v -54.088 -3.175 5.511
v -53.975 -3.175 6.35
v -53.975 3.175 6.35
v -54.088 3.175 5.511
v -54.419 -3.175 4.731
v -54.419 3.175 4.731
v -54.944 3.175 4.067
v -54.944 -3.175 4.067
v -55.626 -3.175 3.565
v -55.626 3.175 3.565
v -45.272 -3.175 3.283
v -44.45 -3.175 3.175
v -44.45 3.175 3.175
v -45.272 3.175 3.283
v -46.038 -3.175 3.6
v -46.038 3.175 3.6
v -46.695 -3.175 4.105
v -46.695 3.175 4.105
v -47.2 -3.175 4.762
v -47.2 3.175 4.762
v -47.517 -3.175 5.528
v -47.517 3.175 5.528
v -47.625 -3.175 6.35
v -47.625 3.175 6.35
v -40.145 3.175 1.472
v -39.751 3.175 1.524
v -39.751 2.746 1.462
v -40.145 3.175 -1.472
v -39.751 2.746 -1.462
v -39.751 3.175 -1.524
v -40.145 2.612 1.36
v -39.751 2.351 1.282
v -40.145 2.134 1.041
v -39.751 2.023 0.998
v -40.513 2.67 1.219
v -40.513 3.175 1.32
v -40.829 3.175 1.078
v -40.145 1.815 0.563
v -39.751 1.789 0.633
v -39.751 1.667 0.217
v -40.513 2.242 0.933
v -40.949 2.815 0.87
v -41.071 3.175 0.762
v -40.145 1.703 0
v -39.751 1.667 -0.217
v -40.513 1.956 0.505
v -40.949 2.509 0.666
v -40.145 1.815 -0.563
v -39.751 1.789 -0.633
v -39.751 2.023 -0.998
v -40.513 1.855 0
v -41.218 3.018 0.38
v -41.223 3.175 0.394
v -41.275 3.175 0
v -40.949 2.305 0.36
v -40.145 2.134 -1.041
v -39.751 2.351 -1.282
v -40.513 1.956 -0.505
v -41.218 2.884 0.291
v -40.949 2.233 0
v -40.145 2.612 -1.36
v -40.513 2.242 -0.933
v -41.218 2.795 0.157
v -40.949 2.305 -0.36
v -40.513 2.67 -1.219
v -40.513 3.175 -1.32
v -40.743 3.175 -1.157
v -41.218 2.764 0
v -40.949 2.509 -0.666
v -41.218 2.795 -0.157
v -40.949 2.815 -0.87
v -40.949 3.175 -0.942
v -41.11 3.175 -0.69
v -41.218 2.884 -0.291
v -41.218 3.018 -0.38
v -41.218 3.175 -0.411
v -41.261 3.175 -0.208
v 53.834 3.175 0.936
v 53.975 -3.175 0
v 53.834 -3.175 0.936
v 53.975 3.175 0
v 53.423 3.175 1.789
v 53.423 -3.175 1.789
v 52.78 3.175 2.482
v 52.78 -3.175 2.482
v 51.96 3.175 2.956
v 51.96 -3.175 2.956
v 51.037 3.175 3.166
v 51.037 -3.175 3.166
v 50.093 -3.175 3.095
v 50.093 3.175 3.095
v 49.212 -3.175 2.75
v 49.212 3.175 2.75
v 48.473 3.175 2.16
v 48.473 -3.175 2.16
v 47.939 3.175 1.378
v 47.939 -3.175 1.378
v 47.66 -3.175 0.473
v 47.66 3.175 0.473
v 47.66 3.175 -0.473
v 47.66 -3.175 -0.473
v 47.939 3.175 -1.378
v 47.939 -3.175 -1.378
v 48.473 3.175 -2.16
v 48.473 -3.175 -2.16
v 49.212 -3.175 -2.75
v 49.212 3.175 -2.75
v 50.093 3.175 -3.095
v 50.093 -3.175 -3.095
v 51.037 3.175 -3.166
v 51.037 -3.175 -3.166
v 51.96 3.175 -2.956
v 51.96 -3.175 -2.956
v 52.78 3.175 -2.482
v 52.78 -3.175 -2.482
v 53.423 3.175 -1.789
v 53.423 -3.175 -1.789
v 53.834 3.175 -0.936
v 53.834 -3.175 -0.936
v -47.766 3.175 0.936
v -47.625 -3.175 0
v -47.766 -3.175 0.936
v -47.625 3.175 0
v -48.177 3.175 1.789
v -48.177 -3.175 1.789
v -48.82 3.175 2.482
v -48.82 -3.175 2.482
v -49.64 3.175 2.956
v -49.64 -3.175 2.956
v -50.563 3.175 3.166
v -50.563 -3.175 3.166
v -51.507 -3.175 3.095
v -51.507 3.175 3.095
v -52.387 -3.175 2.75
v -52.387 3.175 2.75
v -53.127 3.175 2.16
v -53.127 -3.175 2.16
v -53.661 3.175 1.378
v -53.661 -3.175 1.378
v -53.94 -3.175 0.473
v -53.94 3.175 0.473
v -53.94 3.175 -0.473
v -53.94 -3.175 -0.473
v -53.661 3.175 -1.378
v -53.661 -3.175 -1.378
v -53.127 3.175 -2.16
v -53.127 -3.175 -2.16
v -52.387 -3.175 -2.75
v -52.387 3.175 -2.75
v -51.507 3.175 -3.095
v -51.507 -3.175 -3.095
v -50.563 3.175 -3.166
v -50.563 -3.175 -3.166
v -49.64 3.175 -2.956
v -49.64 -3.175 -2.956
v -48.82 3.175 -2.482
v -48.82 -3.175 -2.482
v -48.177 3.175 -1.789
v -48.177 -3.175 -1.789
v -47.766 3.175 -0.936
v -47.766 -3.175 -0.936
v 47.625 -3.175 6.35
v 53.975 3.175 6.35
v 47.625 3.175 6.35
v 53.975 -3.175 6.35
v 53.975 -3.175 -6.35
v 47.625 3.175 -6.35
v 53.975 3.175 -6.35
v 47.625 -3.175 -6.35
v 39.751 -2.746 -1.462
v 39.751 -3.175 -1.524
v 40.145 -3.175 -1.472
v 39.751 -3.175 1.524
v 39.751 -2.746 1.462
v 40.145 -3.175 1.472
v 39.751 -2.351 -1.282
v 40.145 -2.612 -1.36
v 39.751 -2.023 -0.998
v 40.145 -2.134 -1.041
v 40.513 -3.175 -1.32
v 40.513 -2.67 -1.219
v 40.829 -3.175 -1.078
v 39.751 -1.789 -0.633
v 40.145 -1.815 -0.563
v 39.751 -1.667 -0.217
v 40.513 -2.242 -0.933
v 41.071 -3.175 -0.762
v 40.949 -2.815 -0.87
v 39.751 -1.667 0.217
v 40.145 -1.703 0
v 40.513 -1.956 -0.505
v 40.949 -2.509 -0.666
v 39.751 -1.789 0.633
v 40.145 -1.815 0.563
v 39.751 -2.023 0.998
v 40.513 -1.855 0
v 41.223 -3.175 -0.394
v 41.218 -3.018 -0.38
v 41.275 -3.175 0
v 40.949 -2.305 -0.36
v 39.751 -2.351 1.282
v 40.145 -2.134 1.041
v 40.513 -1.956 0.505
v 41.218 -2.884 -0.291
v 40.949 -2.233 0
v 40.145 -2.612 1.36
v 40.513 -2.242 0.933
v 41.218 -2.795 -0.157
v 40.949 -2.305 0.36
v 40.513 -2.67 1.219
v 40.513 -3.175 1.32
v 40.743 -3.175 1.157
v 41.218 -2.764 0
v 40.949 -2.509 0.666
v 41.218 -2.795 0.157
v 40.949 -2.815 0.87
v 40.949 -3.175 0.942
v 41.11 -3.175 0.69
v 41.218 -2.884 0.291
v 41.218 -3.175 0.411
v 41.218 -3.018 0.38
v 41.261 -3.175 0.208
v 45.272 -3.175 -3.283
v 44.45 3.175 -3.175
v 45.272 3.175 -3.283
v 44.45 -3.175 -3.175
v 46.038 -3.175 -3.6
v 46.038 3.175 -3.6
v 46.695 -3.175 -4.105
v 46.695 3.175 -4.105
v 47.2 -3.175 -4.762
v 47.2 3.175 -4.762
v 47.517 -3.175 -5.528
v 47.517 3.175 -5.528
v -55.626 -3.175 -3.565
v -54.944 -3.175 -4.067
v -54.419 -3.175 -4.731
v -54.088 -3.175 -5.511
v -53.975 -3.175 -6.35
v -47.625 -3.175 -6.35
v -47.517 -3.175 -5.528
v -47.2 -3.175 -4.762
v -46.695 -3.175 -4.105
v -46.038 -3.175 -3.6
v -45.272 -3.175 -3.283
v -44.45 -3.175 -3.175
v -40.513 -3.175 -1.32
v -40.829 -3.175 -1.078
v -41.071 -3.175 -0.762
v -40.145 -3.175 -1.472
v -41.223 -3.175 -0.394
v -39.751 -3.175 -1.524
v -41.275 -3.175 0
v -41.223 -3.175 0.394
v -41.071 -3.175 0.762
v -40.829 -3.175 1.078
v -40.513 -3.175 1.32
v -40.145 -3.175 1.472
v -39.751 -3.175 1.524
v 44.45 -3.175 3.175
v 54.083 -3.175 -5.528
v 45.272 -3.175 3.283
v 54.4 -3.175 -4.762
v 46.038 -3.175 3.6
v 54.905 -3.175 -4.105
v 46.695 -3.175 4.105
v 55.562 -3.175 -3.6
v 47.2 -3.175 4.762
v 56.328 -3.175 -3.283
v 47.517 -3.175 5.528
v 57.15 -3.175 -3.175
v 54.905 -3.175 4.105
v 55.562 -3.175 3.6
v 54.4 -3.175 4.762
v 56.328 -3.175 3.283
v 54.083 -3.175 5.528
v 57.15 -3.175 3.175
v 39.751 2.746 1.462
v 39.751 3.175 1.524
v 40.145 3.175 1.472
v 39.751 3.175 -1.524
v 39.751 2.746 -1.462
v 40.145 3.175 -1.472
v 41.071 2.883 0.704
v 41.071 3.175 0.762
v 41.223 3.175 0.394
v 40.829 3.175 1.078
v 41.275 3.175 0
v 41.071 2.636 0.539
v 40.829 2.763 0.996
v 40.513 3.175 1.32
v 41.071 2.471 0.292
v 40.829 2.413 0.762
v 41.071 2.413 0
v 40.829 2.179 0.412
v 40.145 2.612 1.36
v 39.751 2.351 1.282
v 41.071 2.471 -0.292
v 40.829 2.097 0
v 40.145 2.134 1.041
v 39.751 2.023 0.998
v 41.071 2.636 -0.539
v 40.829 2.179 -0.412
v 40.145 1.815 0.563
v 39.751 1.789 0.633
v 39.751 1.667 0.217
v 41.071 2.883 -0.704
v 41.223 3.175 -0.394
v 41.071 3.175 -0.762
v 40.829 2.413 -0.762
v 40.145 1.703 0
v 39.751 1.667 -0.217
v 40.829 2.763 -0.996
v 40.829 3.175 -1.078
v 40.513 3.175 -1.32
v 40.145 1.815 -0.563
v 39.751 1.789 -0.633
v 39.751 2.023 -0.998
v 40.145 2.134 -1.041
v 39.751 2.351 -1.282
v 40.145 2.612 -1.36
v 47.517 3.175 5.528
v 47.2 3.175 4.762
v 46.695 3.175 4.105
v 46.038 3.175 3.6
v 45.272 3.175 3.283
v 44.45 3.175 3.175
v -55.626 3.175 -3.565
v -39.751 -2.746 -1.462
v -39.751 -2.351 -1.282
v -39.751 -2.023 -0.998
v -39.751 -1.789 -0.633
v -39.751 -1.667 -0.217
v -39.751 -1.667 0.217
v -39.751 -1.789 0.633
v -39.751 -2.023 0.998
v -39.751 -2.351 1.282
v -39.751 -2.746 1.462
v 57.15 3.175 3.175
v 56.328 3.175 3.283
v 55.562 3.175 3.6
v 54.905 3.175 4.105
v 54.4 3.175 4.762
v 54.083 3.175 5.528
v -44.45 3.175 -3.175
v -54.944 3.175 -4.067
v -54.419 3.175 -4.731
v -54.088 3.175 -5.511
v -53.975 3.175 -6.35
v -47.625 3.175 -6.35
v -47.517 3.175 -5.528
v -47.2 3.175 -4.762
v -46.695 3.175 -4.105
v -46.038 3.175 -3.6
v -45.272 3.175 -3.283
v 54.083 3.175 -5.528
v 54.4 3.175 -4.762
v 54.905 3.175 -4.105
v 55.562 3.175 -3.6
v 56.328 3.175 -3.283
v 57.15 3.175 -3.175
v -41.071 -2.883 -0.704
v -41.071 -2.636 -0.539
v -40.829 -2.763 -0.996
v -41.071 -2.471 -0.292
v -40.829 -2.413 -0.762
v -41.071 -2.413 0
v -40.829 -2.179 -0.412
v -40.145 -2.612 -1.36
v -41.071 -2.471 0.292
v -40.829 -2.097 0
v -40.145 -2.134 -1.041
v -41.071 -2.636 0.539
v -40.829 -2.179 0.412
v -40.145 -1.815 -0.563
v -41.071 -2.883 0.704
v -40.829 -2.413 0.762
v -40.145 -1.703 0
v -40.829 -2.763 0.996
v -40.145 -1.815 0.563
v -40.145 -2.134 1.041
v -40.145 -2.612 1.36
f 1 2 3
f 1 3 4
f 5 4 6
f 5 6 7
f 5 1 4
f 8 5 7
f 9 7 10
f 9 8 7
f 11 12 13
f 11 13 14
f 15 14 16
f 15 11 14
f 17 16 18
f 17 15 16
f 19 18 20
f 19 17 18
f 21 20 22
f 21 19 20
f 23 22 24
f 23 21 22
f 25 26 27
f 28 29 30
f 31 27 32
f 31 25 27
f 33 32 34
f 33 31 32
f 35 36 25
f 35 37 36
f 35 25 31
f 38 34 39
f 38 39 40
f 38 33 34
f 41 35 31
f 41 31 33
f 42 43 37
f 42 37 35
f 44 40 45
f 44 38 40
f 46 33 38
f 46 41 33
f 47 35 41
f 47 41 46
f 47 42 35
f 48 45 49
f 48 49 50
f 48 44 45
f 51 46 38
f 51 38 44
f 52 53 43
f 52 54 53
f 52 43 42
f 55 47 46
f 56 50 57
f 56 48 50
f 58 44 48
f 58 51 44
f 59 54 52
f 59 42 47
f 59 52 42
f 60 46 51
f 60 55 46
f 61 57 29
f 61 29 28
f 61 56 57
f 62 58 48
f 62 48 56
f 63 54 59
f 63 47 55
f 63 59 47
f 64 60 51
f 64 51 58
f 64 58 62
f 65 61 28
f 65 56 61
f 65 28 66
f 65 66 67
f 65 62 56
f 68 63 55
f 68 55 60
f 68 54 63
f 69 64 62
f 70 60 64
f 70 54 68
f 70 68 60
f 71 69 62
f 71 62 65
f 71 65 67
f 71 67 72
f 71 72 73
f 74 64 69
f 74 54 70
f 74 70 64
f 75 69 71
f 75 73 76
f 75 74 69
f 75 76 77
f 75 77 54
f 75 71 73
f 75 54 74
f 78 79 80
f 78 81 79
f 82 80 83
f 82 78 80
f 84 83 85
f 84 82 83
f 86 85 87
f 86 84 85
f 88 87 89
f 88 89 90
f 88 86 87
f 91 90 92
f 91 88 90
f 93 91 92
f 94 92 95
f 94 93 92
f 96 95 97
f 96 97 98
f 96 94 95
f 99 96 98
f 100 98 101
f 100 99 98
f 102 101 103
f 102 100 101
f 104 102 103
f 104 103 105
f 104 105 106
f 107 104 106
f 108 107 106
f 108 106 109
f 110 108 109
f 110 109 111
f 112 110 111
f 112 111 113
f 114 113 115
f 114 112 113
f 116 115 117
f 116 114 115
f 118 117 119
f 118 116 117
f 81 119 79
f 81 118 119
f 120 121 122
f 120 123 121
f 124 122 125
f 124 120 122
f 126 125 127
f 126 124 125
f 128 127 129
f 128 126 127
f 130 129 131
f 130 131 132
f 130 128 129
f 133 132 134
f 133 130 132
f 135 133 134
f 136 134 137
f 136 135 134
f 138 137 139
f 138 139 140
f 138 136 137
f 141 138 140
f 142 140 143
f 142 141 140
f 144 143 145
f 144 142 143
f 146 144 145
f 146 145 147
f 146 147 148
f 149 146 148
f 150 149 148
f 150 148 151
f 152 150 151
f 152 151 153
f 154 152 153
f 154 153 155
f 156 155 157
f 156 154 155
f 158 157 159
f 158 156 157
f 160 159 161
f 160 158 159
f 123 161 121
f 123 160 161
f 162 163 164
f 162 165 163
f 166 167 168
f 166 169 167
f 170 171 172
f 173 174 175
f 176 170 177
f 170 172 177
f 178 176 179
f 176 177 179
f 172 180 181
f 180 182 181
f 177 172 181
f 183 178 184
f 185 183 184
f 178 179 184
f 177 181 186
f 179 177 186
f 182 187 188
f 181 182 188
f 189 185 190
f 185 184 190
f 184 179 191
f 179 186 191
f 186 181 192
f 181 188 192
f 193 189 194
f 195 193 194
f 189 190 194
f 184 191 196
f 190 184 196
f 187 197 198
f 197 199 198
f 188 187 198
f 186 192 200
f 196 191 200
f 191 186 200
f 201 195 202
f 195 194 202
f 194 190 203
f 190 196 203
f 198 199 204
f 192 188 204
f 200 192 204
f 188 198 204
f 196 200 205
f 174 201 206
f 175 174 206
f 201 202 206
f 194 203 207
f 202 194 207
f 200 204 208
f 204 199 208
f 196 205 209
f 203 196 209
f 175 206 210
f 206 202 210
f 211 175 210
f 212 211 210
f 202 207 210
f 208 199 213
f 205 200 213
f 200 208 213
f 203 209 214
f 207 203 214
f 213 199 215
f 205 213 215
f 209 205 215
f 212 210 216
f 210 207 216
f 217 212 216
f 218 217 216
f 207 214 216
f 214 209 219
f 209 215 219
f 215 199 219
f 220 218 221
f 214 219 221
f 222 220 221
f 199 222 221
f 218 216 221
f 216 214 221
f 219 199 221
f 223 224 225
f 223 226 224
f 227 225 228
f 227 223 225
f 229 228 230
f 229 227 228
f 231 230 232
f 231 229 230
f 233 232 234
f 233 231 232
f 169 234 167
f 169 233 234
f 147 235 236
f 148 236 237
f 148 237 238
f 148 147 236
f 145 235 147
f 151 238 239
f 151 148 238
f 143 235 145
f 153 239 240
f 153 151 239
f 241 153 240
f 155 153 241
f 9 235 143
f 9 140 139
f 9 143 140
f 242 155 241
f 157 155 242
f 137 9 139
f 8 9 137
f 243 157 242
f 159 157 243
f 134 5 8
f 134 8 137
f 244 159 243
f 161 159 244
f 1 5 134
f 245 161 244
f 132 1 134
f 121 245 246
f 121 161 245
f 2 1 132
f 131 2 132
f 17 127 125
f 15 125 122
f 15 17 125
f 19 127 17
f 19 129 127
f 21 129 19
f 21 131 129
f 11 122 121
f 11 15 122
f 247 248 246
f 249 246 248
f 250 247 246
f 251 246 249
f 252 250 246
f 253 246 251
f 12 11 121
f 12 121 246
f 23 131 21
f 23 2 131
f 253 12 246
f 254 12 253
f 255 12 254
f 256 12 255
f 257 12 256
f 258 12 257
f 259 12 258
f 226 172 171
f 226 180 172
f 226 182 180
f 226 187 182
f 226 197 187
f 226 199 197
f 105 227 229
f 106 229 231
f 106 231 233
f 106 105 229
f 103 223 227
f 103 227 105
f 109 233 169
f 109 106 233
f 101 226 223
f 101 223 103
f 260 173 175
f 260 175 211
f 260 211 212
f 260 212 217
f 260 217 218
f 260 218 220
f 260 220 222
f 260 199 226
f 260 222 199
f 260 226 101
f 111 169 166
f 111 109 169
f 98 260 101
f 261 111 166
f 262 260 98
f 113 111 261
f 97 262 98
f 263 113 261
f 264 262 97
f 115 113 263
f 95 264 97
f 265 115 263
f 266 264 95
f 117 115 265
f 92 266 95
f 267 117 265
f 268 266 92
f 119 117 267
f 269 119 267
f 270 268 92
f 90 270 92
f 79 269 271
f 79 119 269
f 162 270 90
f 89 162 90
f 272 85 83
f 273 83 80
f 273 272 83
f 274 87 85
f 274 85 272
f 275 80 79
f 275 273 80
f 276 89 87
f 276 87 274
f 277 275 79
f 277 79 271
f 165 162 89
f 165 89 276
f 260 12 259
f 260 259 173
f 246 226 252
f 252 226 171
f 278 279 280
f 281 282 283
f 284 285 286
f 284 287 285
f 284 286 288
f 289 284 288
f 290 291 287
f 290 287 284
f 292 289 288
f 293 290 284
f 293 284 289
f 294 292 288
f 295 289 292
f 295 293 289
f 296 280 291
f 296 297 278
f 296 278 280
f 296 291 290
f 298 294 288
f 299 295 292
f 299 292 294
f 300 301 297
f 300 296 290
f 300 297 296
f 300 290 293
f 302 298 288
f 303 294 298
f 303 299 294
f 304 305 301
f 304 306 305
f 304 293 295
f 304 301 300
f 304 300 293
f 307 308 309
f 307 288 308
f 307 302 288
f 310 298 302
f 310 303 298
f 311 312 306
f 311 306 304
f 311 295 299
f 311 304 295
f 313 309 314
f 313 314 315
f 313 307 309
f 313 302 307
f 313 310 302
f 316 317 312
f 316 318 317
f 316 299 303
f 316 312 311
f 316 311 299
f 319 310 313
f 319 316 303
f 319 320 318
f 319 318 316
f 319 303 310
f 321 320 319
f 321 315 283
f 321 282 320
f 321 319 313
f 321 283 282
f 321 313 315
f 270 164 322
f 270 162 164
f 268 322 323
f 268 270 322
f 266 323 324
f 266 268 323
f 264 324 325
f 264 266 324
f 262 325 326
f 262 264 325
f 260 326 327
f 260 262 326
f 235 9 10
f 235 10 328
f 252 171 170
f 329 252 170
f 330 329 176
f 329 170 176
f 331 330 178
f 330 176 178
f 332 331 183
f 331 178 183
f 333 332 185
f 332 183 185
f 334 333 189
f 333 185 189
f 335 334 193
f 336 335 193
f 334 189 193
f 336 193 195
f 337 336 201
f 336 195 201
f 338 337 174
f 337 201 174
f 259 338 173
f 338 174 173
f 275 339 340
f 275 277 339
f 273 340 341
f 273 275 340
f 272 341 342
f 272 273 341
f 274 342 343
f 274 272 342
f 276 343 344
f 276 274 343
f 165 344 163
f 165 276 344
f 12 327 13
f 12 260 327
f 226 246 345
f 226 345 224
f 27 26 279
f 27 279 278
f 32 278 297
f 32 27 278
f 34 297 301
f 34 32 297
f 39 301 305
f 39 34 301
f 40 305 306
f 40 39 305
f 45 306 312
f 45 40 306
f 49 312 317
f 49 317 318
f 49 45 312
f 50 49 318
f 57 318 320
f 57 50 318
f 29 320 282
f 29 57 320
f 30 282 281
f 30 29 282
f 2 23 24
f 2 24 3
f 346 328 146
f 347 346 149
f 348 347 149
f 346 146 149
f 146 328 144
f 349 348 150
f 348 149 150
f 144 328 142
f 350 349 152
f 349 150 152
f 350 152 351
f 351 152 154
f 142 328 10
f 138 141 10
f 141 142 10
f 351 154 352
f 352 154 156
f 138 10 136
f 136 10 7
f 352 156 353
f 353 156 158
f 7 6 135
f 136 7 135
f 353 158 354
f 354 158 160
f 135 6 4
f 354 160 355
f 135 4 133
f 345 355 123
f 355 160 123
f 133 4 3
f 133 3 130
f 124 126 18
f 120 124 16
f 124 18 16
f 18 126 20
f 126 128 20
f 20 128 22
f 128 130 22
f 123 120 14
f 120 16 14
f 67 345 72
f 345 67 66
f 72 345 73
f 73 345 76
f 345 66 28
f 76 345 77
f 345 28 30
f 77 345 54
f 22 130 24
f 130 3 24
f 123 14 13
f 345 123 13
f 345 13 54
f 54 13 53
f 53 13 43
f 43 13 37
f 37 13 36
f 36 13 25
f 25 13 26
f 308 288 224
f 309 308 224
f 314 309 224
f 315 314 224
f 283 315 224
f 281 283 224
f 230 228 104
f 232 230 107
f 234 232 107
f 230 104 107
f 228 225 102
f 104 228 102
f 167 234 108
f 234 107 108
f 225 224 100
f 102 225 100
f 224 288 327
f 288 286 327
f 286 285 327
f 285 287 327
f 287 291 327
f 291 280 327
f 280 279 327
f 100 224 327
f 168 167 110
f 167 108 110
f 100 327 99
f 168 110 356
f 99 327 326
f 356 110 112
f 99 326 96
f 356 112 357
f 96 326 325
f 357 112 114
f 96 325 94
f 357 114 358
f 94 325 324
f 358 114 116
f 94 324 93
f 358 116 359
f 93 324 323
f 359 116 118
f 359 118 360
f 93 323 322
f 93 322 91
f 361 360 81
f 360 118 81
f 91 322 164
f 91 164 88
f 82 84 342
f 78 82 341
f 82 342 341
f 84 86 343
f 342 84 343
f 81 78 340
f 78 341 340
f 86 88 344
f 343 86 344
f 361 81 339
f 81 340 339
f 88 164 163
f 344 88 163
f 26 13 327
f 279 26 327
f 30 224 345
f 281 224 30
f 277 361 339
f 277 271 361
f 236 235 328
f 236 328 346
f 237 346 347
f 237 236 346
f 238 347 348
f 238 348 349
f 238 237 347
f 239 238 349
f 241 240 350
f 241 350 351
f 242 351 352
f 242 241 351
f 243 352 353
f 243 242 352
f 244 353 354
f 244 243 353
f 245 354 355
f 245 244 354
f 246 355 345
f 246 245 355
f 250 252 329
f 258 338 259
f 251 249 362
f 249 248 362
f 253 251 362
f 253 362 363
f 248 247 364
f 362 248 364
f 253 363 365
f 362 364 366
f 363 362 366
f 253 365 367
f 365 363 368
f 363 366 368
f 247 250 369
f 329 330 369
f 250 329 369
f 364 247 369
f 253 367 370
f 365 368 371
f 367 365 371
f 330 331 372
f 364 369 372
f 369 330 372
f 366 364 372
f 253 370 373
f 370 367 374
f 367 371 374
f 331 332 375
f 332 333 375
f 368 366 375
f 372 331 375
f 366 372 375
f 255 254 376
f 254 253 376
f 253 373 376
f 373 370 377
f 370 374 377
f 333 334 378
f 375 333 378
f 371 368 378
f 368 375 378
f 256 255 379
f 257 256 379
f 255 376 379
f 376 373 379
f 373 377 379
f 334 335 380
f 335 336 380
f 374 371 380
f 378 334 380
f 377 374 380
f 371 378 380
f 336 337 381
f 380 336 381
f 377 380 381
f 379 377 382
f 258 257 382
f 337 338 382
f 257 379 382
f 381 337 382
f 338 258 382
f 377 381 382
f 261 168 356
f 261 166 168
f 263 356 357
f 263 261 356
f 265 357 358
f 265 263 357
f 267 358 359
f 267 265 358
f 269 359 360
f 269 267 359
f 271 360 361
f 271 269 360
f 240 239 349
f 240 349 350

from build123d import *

# Parameters (mm, degrees)
F0_R     = 3.175
F1_DEPTH = 3.175
F3_DEPTH = 41.275
F4_R     = 1.52399


# Not quite as in the source:
# - a fillet or chamfer is up to 0.001 mm smaller than in the source, because OpenCascade refuses the exact size


with BuildPart() as f1:
    # F0 (on Front) → F1 (new body, symmetric)
    with BuildSketch(Plane.XZ):
        with BuildLine():
            Line((44.45, 3.175), (-44.45, 3.175))
            ThreePointArc((-44.45, 3.175), (-46.6950640303, 4.1049359697), (-47.625, 6.35))
            Line((-47.625, 6.35), (-53.975, 6.35))
            ThreePointArc((-53.975, 6.35), (-54.4187617277, 4.7310613044), (-55.626, 3.5646725507))
            Line((-55.626, 3.5646725507), (-55.626, -3.5646725507))
            ThreePointArc((-55.626, -3.5646725507), (-54.4187617277, -4.7310613044), (-53.975, -6.35))
            Line((-53.975, -6.35), (-47.625, -6.35))
            ThreePointArc((-47.625, -6.35), (-46.6950640303, -4.1049359697), (-44.45, -3.175))
            Line((-44.45, -3.175), (44.45, -3.175))
            ThreePointArc((44.45, -3.175), (46.6950640303, -4.1049359697), (47.625, -6.35))
            Line((47.625, -6.35), (53.975, -6.35))
            ThreePointArc((53.975, -6.35), (54.9049359697, -4.1049359697), (57.15, -3.175))
            Line((57.15, -3.175), (57.15, 3.175))
            ThreePointArc((57.15, 3.175), (54.9049359697, 4.1049359697), (53.975, 6.35))
            Line((53.975, 6.35), (47.625, 6.35))
            ThreePointArc((47.625, 6.35), (46.6950640303, 4.1049359697), (44.45, 3.175))
        make_face()
        with Locations((-50.8, 0)):
            Circle(F0_R, mode=Mode.SUBTRACT)
        with Locations((50.8, 0)):
            Circle(F0_R, mode=Mode.SUBTRACT)
    extrude(amount=F1_DEPTH, both=True)

    # F2 (on Right) → F3 (cut, symmetric)
    with BuildSketch(Plane.YZ):
        with BuildLine():
            Line((3.175, -1.524), (3.175, 1.524))
            ThreePointArc((3.175, 1.524), (1.651, 0), (3.175, -1.524))
        make_face()
        with BuildLine():
            Line((-3.175, 1.524), (-3.175, -1.524))
            ThreePointArc((-3.175, -1.524), (-1.651, 0), (-3.175, 1.524))
        make_face()
    extrude(amount=F3_DEPTH, both=True, mode=Mode.SUBTRACT)

    # F4 (radius 1.524 in the source; OpenCascade refuses exactly that, so slightly less here)
    f4_edges = [f1.edges().sort_by_distance(p)[0] for p in [
        (41.275, 1.651, 0),
        (-41.275, 1.651, 0),
        (-41.275, -1.651, 0),
        (41.275, -1.651, 0),
    ]]
    fillet(f4_edges, radius=F4_R)


solid = f1.part
